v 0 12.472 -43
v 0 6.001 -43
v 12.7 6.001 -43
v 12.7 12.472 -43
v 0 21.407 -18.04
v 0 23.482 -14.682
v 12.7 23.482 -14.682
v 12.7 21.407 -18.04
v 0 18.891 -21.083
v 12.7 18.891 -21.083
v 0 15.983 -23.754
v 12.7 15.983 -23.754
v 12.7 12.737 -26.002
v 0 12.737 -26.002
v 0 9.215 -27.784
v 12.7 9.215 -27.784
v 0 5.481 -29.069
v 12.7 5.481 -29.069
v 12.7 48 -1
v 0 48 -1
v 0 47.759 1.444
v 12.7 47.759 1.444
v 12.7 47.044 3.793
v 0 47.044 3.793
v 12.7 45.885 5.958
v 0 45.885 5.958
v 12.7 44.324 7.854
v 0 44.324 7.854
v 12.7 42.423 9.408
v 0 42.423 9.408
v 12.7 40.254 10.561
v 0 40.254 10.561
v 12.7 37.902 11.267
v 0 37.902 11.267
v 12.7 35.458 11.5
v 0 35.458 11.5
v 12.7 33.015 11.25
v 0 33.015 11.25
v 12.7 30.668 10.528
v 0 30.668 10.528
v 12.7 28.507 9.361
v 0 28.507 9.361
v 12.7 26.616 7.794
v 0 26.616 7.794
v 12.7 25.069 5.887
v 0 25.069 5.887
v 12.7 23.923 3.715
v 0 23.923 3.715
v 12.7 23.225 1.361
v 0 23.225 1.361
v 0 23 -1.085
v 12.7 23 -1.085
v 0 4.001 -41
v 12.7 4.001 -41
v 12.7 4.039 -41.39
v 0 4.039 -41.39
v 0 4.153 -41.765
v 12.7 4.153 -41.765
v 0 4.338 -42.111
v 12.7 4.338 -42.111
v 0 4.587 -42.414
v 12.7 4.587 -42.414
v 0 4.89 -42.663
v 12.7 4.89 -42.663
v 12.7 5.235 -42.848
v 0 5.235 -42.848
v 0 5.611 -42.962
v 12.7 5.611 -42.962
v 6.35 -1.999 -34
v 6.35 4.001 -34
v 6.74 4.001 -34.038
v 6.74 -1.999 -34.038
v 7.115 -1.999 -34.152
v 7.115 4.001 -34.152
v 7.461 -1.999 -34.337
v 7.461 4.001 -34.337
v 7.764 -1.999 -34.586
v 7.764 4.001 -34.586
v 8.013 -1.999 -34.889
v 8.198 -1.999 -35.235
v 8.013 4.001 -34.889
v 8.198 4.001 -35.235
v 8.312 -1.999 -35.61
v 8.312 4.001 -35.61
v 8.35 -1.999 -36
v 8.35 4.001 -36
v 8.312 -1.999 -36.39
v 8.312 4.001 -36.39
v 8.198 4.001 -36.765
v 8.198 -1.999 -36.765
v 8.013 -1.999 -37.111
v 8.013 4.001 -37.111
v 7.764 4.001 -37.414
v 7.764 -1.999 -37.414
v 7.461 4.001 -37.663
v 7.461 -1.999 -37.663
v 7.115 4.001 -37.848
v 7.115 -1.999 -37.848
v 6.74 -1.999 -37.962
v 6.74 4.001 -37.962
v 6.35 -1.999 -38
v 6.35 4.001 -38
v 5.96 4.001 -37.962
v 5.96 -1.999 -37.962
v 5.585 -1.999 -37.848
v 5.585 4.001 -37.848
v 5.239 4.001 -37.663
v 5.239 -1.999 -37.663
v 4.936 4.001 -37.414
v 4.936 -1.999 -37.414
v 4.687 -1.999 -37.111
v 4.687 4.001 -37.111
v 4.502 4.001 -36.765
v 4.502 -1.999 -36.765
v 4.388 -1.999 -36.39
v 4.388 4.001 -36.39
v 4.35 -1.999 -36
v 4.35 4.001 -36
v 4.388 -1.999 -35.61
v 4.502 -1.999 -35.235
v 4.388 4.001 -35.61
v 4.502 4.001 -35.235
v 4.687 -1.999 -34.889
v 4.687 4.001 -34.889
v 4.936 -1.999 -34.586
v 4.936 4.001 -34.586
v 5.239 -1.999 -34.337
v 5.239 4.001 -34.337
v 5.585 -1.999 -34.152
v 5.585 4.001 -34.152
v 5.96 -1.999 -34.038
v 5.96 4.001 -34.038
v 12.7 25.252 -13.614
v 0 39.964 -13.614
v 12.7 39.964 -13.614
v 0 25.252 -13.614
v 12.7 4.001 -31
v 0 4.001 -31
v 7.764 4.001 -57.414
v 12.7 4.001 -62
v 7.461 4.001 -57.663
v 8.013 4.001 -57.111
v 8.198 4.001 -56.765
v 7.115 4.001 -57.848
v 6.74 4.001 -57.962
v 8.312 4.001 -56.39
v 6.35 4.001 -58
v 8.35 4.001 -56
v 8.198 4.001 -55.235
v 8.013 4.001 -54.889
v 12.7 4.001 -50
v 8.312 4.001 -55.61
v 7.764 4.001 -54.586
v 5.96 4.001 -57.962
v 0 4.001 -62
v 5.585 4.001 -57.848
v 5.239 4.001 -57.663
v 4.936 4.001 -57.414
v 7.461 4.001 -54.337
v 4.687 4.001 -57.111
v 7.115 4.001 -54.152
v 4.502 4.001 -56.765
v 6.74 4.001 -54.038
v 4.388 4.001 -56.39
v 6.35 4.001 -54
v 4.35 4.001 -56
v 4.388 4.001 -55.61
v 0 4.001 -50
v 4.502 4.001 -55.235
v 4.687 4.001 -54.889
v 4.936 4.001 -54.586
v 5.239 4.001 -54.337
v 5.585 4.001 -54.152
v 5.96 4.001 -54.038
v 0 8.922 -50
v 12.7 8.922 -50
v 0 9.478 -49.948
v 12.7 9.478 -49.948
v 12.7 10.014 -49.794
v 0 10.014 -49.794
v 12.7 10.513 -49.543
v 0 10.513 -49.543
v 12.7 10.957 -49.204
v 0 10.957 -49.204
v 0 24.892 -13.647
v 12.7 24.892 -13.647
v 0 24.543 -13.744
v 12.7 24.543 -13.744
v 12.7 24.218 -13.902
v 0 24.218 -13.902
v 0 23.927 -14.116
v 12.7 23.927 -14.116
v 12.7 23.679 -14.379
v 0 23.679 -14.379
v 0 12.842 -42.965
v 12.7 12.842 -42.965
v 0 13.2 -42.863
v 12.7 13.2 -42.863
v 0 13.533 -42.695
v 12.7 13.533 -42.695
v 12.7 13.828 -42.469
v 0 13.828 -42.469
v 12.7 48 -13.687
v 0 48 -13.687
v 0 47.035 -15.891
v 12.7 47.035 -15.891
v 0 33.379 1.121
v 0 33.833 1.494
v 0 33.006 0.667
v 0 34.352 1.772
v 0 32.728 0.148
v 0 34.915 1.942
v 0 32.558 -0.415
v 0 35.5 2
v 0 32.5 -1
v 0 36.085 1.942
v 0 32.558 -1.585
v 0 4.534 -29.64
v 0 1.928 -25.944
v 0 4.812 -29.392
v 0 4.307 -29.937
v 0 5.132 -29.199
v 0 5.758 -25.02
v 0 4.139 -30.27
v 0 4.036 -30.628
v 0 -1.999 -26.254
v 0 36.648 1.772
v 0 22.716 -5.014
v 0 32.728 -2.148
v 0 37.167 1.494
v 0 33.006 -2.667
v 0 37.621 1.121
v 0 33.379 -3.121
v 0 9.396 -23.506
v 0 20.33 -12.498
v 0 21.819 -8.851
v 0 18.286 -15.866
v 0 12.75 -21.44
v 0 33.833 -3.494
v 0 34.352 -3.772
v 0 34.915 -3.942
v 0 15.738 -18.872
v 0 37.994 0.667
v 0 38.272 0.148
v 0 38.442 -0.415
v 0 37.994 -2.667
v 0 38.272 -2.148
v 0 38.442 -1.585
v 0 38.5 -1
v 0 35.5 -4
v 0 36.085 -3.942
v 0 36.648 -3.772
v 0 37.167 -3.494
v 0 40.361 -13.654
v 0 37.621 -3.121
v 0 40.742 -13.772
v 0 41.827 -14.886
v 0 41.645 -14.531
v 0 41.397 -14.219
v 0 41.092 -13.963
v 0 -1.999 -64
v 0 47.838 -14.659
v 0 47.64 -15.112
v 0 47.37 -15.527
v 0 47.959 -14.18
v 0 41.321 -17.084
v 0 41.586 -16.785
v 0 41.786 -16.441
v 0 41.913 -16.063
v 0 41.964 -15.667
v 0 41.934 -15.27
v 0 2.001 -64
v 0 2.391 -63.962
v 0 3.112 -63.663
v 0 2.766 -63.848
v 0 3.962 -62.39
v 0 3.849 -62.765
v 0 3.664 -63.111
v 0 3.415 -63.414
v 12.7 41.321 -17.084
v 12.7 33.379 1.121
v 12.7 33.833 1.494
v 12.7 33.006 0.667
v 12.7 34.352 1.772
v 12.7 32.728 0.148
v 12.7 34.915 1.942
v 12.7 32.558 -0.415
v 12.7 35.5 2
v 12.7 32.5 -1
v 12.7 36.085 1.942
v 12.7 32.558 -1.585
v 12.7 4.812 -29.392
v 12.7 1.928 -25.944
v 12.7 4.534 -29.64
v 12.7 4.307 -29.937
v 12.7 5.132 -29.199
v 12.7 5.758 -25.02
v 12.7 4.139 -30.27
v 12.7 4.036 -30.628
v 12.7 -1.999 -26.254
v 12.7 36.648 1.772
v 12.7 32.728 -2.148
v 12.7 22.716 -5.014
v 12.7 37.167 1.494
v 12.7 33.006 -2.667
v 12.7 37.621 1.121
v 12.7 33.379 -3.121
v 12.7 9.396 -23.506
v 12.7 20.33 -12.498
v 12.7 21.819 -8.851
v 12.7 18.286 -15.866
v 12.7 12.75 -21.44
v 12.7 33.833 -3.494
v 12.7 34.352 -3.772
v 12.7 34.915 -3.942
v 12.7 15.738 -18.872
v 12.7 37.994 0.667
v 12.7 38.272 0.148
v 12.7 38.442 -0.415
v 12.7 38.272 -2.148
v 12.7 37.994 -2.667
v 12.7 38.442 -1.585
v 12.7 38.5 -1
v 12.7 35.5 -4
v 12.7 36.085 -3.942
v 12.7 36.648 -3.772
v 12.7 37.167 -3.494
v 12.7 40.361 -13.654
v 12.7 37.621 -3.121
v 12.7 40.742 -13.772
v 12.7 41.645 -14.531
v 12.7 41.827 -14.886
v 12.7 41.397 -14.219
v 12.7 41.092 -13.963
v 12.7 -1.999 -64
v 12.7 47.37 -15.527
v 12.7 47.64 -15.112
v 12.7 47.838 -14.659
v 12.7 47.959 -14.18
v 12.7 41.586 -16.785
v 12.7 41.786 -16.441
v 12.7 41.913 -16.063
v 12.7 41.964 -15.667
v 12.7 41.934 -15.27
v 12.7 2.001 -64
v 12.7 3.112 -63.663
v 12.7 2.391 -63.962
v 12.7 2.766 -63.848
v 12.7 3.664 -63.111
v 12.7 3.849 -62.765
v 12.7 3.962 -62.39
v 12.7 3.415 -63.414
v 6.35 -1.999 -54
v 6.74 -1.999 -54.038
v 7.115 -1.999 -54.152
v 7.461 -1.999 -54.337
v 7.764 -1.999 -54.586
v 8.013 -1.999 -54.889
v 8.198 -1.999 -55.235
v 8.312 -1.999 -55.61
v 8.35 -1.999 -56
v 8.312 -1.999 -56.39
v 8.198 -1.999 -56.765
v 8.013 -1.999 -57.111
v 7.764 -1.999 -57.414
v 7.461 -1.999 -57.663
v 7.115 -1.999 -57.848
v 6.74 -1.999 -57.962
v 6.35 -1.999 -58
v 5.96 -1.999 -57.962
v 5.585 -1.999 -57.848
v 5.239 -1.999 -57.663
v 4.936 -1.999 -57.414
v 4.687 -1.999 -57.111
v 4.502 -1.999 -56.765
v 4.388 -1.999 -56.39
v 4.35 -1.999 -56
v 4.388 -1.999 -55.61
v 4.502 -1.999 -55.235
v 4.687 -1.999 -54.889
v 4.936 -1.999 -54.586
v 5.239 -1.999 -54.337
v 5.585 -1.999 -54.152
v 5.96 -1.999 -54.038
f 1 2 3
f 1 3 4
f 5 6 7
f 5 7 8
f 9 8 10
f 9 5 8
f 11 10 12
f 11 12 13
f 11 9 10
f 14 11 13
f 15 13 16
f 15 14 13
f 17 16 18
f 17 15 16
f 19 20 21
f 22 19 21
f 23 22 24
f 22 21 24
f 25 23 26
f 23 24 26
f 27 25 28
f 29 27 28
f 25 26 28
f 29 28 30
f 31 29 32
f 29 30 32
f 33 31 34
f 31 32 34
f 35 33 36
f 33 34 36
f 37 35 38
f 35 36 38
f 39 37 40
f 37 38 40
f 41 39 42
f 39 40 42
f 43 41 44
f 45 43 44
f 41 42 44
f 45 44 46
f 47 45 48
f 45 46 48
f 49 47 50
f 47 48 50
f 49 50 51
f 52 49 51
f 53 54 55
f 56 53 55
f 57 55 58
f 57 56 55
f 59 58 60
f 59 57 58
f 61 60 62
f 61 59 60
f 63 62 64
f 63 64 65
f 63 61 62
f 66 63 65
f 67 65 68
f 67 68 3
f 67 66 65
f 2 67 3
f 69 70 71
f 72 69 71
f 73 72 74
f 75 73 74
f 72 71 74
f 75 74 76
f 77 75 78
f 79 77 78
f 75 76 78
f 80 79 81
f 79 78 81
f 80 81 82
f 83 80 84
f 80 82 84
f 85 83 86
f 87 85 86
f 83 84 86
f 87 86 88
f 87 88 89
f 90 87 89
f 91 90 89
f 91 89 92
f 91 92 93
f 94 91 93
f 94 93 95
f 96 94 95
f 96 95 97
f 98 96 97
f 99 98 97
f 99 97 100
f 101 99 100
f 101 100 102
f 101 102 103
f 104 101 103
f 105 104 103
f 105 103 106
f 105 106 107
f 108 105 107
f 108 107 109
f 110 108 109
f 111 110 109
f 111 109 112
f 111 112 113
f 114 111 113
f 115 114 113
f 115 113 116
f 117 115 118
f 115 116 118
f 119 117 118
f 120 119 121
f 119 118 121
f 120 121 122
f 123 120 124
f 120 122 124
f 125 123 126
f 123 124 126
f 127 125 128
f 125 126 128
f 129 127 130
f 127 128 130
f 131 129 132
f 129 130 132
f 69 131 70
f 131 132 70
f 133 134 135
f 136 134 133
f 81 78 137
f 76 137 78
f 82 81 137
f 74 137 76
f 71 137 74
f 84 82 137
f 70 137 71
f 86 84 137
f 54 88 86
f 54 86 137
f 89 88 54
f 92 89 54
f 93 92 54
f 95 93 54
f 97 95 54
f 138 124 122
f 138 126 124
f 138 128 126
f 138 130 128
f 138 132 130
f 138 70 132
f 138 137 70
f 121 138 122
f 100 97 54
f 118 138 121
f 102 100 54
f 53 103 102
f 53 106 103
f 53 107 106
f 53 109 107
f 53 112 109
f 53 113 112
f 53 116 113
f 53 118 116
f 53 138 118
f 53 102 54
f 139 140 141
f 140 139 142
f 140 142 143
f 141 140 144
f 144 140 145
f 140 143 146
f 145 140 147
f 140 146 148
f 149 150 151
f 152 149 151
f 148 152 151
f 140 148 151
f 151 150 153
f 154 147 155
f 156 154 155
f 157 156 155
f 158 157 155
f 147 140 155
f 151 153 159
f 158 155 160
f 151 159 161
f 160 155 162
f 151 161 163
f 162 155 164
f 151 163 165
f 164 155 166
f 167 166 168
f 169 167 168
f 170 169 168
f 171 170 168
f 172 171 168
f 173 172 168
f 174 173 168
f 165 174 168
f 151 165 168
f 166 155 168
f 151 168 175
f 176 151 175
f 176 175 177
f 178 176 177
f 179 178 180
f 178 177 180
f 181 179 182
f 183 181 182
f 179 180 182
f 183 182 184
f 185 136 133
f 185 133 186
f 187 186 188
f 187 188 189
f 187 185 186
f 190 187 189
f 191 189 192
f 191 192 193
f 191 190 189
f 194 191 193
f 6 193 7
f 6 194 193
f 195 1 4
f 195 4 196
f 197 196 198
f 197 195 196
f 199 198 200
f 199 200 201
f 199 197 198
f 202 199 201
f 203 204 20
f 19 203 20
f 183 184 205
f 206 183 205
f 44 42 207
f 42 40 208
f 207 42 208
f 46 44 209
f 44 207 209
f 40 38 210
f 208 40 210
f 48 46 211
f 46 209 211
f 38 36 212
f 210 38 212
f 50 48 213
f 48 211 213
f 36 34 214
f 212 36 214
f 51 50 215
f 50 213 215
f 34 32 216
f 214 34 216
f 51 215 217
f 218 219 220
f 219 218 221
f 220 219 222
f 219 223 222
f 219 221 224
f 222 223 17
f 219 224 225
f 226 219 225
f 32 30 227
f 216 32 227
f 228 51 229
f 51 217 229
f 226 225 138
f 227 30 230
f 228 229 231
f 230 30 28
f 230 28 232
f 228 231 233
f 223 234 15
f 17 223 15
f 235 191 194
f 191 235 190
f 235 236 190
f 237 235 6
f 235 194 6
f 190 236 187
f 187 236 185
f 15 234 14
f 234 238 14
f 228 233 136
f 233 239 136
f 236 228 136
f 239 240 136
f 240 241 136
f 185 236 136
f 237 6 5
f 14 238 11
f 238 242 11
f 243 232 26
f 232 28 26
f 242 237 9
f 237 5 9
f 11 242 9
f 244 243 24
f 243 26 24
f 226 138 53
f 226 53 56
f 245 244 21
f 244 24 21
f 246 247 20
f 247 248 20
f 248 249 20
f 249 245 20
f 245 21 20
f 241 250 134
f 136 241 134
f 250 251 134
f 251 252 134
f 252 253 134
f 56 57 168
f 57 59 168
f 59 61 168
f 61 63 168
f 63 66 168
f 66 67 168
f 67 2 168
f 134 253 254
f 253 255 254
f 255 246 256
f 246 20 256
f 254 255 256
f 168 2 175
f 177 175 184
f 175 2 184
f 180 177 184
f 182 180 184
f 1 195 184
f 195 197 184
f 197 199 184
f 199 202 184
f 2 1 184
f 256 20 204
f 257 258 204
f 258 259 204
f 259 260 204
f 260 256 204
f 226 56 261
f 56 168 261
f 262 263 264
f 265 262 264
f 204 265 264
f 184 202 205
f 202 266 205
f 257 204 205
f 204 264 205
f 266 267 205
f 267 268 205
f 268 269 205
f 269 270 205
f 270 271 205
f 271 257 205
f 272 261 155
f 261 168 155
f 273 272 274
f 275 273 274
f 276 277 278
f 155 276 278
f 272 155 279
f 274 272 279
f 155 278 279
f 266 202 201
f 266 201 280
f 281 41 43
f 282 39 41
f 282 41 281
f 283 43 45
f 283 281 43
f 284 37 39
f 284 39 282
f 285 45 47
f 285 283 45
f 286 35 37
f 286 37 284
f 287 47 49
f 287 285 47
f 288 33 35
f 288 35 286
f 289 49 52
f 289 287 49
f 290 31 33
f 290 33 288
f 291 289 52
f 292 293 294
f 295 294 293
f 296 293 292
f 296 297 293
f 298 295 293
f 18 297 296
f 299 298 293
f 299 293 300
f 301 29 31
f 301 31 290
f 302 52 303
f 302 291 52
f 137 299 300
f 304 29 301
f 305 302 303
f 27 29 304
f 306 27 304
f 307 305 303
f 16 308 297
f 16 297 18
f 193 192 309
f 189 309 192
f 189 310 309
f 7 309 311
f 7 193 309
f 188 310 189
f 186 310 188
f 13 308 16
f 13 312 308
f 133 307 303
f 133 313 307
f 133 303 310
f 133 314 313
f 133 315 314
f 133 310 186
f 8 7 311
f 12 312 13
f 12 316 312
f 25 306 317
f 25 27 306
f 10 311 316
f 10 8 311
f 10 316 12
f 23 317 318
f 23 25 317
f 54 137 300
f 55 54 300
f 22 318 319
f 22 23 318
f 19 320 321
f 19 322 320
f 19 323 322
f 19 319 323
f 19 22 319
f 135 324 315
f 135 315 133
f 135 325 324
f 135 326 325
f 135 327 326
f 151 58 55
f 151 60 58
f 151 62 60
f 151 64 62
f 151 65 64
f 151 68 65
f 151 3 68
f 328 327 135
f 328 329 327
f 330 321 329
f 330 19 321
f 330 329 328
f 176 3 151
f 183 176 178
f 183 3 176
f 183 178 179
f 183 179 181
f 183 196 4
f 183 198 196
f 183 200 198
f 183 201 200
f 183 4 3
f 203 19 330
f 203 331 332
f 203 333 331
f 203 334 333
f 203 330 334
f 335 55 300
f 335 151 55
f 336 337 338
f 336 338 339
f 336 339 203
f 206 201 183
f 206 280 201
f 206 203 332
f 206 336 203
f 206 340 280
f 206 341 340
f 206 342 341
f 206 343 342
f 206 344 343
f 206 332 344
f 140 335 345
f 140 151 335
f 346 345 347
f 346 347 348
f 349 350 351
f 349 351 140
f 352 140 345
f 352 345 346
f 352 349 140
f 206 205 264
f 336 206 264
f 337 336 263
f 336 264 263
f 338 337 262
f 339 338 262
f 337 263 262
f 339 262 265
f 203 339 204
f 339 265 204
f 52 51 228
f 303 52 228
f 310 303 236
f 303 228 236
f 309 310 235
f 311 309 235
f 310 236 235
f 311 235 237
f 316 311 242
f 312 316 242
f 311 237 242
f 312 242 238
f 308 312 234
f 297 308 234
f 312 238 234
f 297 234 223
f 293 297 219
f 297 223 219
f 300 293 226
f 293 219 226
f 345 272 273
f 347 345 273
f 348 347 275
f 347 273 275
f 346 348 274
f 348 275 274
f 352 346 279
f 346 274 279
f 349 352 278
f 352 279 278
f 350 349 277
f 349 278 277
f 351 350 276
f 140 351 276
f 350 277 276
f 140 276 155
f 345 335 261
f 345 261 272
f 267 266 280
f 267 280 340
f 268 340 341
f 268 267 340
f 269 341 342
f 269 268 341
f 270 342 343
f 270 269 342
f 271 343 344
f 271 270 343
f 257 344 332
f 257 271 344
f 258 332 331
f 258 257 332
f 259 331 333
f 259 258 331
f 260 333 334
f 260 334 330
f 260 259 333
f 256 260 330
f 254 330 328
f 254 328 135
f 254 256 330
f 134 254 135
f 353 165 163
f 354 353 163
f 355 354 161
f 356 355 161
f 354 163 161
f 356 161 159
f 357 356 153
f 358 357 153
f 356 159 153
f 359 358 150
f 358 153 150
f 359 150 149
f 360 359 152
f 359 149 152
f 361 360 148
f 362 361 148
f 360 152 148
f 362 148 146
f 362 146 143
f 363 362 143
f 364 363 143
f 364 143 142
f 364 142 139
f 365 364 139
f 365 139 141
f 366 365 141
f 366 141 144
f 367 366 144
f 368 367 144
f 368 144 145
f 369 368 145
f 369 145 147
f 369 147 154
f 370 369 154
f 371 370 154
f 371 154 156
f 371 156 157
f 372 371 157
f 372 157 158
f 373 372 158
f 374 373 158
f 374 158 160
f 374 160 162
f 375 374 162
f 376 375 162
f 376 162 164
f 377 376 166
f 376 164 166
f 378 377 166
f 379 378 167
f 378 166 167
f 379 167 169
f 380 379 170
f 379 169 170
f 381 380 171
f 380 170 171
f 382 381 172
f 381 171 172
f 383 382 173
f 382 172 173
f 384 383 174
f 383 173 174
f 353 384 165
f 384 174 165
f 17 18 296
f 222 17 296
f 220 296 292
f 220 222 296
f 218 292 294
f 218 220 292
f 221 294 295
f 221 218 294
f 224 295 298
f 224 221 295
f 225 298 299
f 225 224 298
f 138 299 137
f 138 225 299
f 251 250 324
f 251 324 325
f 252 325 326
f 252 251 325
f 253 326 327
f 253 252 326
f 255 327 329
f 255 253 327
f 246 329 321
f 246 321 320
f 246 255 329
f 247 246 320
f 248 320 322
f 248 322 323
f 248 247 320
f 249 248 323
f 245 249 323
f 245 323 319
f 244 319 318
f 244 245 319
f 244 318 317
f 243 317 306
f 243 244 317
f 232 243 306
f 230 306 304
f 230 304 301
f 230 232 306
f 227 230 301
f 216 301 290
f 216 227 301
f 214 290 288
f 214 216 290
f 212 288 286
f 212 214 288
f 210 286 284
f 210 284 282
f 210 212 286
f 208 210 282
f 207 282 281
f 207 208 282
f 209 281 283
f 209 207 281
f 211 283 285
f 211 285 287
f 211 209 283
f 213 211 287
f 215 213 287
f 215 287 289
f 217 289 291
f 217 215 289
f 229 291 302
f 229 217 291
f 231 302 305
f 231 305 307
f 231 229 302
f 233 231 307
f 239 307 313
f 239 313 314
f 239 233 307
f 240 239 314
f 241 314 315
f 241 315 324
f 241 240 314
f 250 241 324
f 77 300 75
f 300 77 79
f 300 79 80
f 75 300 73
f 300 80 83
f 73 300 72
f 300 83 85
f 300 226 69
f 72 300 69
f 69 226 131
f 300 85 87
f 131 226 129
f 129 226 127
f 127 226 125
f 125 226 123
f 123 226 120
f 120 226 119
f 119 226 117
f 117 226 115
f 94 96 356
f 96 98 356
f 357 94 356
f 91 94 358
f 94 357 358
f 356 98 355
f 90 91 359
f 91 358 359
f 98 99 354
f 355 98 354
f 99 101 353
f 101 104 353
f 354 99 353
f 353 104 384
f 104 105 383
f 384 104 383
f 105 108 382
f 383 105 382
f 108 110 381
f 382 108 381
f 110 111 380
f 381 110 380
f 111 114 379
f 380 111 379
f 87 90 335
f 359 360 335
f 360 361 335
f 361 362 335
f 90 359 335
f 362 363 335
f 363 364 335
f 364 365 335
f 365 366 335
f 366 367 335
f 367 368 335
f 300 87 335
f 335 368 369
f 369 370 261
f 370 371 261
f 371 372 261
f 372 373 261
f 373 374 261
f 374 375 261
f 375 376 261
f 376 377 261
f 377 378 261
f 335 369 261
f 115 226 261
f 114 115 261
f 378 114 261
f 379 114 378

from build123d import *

# Parameters (mm, degrees)
SKETCH1_R             = 3
BOSS_EXTRUDE2_DEPTH   = 12.7
CROQUIS3_R            = 2
CORTAR_EXTRUIR2_DEPTH = 25


with BuildPart() as part:
    # Sketch1 → Boss-Extrude2 (new body)
    with BuildSketch(Plane(origin=(0, 0, 0), x_dir=(0, 0, -1), z_dir=(1, 0, 0))):
        with BuildLine():
            Line((49.204101374, 10.956842444), (15.890879059, 47.035174964))
            ThreePointArc((15.890879059, 47.035174964), (14.889789553, 47.748228965), (13.686777685, 48))
            Line((13.686777685, 48), (1, 48))
            ThreePointArc((1, 48), (-11.499928284, 35.457657454), (1.084684606, 23.000286863))
            ThreePointArc((1.084684606, 23.000286863), (18.871740524, 15.738310099), (26.254053819, -1.999139412))
            Line((26.254053819, -1.999139412), (64, -1.999139412))
            Line((64, -1.999139412), (64, 2.000860588))
            ThreePointArc((64, 2.000860588), (63.414213562, 3.41507415), (62, 4.000860588))
            Line((62, 4.000860588), (50, 4.000860588))
            Line((50, 4.000860588), (50, 8.921667481))
            ThreePointArc((50, 8.921667481), (49.793949187, 10.014300969), (49.204101374, 10.956842444))
        make_face()
        with Locations((1, 35.5)):
            Circle(SKETCH1_R, mode=Mode.SUBTRACT)
        with BuildLine():
            Line((42.469400916, 13.828321623), (17.083800106, 41.321013221))
            ThreePointArc((17.083800106, 41.321013221), (14.885976864, 41.826862703), (13.61439919, 39.964229912))
            Line((13.61439919, 39.964229912), (13.61439919, 25.251581588))
            ThreePointArc((13.61439919, 25.251581588), (13.901973758, 24.218334695), (14.681998331, 23.482223332))
            ThreePointArc((14.681998331, 23.482223332), (23.753909667, 15.98324163), (29.068629616, 5.481429706))
            ThreePointArc((29.068629616, 5.481429706), (29.78321361, 4.413589067), (31, 4.000860588))
            Line((31, 4.000860588), (41, 4.000860588))
            ThreePointArc((41, 4.000860588), (42.414213562, 4.586647025), (43, 6.000860588))
            Line((43, 6.000860588), (43, 12.471538314))
            ThreePointArc((43, 12.471538314), (42.862632792, 13.199960639), (42.469400916, 13.828321623))
        make_face(mode=Mode.SUBTRACT)
    extrude(amount=BOSS_EXTRUDE2_DEPTH)

    # Croquis3 → Cortar-Extruir2 (cut)
    with BuildSketch(Plane(origin=(0, 4.000860588, 0), x_dir=(1, 0, 0), z_dir=(0, 1, 0))):
        with Locations(Location((6.35, 56, 0), (0, 0, 270))):
            Circle(CROQUIS3_R)
        with Locations(Location((6.35, 36, 0), (0, 0, 270))):
            Circle(CROQUIS3_R)
    extrude(amount=-CORTAR_EXTRUIR2_DEPTH, mode=Mode.SUBTRACT)


solid = part.part
